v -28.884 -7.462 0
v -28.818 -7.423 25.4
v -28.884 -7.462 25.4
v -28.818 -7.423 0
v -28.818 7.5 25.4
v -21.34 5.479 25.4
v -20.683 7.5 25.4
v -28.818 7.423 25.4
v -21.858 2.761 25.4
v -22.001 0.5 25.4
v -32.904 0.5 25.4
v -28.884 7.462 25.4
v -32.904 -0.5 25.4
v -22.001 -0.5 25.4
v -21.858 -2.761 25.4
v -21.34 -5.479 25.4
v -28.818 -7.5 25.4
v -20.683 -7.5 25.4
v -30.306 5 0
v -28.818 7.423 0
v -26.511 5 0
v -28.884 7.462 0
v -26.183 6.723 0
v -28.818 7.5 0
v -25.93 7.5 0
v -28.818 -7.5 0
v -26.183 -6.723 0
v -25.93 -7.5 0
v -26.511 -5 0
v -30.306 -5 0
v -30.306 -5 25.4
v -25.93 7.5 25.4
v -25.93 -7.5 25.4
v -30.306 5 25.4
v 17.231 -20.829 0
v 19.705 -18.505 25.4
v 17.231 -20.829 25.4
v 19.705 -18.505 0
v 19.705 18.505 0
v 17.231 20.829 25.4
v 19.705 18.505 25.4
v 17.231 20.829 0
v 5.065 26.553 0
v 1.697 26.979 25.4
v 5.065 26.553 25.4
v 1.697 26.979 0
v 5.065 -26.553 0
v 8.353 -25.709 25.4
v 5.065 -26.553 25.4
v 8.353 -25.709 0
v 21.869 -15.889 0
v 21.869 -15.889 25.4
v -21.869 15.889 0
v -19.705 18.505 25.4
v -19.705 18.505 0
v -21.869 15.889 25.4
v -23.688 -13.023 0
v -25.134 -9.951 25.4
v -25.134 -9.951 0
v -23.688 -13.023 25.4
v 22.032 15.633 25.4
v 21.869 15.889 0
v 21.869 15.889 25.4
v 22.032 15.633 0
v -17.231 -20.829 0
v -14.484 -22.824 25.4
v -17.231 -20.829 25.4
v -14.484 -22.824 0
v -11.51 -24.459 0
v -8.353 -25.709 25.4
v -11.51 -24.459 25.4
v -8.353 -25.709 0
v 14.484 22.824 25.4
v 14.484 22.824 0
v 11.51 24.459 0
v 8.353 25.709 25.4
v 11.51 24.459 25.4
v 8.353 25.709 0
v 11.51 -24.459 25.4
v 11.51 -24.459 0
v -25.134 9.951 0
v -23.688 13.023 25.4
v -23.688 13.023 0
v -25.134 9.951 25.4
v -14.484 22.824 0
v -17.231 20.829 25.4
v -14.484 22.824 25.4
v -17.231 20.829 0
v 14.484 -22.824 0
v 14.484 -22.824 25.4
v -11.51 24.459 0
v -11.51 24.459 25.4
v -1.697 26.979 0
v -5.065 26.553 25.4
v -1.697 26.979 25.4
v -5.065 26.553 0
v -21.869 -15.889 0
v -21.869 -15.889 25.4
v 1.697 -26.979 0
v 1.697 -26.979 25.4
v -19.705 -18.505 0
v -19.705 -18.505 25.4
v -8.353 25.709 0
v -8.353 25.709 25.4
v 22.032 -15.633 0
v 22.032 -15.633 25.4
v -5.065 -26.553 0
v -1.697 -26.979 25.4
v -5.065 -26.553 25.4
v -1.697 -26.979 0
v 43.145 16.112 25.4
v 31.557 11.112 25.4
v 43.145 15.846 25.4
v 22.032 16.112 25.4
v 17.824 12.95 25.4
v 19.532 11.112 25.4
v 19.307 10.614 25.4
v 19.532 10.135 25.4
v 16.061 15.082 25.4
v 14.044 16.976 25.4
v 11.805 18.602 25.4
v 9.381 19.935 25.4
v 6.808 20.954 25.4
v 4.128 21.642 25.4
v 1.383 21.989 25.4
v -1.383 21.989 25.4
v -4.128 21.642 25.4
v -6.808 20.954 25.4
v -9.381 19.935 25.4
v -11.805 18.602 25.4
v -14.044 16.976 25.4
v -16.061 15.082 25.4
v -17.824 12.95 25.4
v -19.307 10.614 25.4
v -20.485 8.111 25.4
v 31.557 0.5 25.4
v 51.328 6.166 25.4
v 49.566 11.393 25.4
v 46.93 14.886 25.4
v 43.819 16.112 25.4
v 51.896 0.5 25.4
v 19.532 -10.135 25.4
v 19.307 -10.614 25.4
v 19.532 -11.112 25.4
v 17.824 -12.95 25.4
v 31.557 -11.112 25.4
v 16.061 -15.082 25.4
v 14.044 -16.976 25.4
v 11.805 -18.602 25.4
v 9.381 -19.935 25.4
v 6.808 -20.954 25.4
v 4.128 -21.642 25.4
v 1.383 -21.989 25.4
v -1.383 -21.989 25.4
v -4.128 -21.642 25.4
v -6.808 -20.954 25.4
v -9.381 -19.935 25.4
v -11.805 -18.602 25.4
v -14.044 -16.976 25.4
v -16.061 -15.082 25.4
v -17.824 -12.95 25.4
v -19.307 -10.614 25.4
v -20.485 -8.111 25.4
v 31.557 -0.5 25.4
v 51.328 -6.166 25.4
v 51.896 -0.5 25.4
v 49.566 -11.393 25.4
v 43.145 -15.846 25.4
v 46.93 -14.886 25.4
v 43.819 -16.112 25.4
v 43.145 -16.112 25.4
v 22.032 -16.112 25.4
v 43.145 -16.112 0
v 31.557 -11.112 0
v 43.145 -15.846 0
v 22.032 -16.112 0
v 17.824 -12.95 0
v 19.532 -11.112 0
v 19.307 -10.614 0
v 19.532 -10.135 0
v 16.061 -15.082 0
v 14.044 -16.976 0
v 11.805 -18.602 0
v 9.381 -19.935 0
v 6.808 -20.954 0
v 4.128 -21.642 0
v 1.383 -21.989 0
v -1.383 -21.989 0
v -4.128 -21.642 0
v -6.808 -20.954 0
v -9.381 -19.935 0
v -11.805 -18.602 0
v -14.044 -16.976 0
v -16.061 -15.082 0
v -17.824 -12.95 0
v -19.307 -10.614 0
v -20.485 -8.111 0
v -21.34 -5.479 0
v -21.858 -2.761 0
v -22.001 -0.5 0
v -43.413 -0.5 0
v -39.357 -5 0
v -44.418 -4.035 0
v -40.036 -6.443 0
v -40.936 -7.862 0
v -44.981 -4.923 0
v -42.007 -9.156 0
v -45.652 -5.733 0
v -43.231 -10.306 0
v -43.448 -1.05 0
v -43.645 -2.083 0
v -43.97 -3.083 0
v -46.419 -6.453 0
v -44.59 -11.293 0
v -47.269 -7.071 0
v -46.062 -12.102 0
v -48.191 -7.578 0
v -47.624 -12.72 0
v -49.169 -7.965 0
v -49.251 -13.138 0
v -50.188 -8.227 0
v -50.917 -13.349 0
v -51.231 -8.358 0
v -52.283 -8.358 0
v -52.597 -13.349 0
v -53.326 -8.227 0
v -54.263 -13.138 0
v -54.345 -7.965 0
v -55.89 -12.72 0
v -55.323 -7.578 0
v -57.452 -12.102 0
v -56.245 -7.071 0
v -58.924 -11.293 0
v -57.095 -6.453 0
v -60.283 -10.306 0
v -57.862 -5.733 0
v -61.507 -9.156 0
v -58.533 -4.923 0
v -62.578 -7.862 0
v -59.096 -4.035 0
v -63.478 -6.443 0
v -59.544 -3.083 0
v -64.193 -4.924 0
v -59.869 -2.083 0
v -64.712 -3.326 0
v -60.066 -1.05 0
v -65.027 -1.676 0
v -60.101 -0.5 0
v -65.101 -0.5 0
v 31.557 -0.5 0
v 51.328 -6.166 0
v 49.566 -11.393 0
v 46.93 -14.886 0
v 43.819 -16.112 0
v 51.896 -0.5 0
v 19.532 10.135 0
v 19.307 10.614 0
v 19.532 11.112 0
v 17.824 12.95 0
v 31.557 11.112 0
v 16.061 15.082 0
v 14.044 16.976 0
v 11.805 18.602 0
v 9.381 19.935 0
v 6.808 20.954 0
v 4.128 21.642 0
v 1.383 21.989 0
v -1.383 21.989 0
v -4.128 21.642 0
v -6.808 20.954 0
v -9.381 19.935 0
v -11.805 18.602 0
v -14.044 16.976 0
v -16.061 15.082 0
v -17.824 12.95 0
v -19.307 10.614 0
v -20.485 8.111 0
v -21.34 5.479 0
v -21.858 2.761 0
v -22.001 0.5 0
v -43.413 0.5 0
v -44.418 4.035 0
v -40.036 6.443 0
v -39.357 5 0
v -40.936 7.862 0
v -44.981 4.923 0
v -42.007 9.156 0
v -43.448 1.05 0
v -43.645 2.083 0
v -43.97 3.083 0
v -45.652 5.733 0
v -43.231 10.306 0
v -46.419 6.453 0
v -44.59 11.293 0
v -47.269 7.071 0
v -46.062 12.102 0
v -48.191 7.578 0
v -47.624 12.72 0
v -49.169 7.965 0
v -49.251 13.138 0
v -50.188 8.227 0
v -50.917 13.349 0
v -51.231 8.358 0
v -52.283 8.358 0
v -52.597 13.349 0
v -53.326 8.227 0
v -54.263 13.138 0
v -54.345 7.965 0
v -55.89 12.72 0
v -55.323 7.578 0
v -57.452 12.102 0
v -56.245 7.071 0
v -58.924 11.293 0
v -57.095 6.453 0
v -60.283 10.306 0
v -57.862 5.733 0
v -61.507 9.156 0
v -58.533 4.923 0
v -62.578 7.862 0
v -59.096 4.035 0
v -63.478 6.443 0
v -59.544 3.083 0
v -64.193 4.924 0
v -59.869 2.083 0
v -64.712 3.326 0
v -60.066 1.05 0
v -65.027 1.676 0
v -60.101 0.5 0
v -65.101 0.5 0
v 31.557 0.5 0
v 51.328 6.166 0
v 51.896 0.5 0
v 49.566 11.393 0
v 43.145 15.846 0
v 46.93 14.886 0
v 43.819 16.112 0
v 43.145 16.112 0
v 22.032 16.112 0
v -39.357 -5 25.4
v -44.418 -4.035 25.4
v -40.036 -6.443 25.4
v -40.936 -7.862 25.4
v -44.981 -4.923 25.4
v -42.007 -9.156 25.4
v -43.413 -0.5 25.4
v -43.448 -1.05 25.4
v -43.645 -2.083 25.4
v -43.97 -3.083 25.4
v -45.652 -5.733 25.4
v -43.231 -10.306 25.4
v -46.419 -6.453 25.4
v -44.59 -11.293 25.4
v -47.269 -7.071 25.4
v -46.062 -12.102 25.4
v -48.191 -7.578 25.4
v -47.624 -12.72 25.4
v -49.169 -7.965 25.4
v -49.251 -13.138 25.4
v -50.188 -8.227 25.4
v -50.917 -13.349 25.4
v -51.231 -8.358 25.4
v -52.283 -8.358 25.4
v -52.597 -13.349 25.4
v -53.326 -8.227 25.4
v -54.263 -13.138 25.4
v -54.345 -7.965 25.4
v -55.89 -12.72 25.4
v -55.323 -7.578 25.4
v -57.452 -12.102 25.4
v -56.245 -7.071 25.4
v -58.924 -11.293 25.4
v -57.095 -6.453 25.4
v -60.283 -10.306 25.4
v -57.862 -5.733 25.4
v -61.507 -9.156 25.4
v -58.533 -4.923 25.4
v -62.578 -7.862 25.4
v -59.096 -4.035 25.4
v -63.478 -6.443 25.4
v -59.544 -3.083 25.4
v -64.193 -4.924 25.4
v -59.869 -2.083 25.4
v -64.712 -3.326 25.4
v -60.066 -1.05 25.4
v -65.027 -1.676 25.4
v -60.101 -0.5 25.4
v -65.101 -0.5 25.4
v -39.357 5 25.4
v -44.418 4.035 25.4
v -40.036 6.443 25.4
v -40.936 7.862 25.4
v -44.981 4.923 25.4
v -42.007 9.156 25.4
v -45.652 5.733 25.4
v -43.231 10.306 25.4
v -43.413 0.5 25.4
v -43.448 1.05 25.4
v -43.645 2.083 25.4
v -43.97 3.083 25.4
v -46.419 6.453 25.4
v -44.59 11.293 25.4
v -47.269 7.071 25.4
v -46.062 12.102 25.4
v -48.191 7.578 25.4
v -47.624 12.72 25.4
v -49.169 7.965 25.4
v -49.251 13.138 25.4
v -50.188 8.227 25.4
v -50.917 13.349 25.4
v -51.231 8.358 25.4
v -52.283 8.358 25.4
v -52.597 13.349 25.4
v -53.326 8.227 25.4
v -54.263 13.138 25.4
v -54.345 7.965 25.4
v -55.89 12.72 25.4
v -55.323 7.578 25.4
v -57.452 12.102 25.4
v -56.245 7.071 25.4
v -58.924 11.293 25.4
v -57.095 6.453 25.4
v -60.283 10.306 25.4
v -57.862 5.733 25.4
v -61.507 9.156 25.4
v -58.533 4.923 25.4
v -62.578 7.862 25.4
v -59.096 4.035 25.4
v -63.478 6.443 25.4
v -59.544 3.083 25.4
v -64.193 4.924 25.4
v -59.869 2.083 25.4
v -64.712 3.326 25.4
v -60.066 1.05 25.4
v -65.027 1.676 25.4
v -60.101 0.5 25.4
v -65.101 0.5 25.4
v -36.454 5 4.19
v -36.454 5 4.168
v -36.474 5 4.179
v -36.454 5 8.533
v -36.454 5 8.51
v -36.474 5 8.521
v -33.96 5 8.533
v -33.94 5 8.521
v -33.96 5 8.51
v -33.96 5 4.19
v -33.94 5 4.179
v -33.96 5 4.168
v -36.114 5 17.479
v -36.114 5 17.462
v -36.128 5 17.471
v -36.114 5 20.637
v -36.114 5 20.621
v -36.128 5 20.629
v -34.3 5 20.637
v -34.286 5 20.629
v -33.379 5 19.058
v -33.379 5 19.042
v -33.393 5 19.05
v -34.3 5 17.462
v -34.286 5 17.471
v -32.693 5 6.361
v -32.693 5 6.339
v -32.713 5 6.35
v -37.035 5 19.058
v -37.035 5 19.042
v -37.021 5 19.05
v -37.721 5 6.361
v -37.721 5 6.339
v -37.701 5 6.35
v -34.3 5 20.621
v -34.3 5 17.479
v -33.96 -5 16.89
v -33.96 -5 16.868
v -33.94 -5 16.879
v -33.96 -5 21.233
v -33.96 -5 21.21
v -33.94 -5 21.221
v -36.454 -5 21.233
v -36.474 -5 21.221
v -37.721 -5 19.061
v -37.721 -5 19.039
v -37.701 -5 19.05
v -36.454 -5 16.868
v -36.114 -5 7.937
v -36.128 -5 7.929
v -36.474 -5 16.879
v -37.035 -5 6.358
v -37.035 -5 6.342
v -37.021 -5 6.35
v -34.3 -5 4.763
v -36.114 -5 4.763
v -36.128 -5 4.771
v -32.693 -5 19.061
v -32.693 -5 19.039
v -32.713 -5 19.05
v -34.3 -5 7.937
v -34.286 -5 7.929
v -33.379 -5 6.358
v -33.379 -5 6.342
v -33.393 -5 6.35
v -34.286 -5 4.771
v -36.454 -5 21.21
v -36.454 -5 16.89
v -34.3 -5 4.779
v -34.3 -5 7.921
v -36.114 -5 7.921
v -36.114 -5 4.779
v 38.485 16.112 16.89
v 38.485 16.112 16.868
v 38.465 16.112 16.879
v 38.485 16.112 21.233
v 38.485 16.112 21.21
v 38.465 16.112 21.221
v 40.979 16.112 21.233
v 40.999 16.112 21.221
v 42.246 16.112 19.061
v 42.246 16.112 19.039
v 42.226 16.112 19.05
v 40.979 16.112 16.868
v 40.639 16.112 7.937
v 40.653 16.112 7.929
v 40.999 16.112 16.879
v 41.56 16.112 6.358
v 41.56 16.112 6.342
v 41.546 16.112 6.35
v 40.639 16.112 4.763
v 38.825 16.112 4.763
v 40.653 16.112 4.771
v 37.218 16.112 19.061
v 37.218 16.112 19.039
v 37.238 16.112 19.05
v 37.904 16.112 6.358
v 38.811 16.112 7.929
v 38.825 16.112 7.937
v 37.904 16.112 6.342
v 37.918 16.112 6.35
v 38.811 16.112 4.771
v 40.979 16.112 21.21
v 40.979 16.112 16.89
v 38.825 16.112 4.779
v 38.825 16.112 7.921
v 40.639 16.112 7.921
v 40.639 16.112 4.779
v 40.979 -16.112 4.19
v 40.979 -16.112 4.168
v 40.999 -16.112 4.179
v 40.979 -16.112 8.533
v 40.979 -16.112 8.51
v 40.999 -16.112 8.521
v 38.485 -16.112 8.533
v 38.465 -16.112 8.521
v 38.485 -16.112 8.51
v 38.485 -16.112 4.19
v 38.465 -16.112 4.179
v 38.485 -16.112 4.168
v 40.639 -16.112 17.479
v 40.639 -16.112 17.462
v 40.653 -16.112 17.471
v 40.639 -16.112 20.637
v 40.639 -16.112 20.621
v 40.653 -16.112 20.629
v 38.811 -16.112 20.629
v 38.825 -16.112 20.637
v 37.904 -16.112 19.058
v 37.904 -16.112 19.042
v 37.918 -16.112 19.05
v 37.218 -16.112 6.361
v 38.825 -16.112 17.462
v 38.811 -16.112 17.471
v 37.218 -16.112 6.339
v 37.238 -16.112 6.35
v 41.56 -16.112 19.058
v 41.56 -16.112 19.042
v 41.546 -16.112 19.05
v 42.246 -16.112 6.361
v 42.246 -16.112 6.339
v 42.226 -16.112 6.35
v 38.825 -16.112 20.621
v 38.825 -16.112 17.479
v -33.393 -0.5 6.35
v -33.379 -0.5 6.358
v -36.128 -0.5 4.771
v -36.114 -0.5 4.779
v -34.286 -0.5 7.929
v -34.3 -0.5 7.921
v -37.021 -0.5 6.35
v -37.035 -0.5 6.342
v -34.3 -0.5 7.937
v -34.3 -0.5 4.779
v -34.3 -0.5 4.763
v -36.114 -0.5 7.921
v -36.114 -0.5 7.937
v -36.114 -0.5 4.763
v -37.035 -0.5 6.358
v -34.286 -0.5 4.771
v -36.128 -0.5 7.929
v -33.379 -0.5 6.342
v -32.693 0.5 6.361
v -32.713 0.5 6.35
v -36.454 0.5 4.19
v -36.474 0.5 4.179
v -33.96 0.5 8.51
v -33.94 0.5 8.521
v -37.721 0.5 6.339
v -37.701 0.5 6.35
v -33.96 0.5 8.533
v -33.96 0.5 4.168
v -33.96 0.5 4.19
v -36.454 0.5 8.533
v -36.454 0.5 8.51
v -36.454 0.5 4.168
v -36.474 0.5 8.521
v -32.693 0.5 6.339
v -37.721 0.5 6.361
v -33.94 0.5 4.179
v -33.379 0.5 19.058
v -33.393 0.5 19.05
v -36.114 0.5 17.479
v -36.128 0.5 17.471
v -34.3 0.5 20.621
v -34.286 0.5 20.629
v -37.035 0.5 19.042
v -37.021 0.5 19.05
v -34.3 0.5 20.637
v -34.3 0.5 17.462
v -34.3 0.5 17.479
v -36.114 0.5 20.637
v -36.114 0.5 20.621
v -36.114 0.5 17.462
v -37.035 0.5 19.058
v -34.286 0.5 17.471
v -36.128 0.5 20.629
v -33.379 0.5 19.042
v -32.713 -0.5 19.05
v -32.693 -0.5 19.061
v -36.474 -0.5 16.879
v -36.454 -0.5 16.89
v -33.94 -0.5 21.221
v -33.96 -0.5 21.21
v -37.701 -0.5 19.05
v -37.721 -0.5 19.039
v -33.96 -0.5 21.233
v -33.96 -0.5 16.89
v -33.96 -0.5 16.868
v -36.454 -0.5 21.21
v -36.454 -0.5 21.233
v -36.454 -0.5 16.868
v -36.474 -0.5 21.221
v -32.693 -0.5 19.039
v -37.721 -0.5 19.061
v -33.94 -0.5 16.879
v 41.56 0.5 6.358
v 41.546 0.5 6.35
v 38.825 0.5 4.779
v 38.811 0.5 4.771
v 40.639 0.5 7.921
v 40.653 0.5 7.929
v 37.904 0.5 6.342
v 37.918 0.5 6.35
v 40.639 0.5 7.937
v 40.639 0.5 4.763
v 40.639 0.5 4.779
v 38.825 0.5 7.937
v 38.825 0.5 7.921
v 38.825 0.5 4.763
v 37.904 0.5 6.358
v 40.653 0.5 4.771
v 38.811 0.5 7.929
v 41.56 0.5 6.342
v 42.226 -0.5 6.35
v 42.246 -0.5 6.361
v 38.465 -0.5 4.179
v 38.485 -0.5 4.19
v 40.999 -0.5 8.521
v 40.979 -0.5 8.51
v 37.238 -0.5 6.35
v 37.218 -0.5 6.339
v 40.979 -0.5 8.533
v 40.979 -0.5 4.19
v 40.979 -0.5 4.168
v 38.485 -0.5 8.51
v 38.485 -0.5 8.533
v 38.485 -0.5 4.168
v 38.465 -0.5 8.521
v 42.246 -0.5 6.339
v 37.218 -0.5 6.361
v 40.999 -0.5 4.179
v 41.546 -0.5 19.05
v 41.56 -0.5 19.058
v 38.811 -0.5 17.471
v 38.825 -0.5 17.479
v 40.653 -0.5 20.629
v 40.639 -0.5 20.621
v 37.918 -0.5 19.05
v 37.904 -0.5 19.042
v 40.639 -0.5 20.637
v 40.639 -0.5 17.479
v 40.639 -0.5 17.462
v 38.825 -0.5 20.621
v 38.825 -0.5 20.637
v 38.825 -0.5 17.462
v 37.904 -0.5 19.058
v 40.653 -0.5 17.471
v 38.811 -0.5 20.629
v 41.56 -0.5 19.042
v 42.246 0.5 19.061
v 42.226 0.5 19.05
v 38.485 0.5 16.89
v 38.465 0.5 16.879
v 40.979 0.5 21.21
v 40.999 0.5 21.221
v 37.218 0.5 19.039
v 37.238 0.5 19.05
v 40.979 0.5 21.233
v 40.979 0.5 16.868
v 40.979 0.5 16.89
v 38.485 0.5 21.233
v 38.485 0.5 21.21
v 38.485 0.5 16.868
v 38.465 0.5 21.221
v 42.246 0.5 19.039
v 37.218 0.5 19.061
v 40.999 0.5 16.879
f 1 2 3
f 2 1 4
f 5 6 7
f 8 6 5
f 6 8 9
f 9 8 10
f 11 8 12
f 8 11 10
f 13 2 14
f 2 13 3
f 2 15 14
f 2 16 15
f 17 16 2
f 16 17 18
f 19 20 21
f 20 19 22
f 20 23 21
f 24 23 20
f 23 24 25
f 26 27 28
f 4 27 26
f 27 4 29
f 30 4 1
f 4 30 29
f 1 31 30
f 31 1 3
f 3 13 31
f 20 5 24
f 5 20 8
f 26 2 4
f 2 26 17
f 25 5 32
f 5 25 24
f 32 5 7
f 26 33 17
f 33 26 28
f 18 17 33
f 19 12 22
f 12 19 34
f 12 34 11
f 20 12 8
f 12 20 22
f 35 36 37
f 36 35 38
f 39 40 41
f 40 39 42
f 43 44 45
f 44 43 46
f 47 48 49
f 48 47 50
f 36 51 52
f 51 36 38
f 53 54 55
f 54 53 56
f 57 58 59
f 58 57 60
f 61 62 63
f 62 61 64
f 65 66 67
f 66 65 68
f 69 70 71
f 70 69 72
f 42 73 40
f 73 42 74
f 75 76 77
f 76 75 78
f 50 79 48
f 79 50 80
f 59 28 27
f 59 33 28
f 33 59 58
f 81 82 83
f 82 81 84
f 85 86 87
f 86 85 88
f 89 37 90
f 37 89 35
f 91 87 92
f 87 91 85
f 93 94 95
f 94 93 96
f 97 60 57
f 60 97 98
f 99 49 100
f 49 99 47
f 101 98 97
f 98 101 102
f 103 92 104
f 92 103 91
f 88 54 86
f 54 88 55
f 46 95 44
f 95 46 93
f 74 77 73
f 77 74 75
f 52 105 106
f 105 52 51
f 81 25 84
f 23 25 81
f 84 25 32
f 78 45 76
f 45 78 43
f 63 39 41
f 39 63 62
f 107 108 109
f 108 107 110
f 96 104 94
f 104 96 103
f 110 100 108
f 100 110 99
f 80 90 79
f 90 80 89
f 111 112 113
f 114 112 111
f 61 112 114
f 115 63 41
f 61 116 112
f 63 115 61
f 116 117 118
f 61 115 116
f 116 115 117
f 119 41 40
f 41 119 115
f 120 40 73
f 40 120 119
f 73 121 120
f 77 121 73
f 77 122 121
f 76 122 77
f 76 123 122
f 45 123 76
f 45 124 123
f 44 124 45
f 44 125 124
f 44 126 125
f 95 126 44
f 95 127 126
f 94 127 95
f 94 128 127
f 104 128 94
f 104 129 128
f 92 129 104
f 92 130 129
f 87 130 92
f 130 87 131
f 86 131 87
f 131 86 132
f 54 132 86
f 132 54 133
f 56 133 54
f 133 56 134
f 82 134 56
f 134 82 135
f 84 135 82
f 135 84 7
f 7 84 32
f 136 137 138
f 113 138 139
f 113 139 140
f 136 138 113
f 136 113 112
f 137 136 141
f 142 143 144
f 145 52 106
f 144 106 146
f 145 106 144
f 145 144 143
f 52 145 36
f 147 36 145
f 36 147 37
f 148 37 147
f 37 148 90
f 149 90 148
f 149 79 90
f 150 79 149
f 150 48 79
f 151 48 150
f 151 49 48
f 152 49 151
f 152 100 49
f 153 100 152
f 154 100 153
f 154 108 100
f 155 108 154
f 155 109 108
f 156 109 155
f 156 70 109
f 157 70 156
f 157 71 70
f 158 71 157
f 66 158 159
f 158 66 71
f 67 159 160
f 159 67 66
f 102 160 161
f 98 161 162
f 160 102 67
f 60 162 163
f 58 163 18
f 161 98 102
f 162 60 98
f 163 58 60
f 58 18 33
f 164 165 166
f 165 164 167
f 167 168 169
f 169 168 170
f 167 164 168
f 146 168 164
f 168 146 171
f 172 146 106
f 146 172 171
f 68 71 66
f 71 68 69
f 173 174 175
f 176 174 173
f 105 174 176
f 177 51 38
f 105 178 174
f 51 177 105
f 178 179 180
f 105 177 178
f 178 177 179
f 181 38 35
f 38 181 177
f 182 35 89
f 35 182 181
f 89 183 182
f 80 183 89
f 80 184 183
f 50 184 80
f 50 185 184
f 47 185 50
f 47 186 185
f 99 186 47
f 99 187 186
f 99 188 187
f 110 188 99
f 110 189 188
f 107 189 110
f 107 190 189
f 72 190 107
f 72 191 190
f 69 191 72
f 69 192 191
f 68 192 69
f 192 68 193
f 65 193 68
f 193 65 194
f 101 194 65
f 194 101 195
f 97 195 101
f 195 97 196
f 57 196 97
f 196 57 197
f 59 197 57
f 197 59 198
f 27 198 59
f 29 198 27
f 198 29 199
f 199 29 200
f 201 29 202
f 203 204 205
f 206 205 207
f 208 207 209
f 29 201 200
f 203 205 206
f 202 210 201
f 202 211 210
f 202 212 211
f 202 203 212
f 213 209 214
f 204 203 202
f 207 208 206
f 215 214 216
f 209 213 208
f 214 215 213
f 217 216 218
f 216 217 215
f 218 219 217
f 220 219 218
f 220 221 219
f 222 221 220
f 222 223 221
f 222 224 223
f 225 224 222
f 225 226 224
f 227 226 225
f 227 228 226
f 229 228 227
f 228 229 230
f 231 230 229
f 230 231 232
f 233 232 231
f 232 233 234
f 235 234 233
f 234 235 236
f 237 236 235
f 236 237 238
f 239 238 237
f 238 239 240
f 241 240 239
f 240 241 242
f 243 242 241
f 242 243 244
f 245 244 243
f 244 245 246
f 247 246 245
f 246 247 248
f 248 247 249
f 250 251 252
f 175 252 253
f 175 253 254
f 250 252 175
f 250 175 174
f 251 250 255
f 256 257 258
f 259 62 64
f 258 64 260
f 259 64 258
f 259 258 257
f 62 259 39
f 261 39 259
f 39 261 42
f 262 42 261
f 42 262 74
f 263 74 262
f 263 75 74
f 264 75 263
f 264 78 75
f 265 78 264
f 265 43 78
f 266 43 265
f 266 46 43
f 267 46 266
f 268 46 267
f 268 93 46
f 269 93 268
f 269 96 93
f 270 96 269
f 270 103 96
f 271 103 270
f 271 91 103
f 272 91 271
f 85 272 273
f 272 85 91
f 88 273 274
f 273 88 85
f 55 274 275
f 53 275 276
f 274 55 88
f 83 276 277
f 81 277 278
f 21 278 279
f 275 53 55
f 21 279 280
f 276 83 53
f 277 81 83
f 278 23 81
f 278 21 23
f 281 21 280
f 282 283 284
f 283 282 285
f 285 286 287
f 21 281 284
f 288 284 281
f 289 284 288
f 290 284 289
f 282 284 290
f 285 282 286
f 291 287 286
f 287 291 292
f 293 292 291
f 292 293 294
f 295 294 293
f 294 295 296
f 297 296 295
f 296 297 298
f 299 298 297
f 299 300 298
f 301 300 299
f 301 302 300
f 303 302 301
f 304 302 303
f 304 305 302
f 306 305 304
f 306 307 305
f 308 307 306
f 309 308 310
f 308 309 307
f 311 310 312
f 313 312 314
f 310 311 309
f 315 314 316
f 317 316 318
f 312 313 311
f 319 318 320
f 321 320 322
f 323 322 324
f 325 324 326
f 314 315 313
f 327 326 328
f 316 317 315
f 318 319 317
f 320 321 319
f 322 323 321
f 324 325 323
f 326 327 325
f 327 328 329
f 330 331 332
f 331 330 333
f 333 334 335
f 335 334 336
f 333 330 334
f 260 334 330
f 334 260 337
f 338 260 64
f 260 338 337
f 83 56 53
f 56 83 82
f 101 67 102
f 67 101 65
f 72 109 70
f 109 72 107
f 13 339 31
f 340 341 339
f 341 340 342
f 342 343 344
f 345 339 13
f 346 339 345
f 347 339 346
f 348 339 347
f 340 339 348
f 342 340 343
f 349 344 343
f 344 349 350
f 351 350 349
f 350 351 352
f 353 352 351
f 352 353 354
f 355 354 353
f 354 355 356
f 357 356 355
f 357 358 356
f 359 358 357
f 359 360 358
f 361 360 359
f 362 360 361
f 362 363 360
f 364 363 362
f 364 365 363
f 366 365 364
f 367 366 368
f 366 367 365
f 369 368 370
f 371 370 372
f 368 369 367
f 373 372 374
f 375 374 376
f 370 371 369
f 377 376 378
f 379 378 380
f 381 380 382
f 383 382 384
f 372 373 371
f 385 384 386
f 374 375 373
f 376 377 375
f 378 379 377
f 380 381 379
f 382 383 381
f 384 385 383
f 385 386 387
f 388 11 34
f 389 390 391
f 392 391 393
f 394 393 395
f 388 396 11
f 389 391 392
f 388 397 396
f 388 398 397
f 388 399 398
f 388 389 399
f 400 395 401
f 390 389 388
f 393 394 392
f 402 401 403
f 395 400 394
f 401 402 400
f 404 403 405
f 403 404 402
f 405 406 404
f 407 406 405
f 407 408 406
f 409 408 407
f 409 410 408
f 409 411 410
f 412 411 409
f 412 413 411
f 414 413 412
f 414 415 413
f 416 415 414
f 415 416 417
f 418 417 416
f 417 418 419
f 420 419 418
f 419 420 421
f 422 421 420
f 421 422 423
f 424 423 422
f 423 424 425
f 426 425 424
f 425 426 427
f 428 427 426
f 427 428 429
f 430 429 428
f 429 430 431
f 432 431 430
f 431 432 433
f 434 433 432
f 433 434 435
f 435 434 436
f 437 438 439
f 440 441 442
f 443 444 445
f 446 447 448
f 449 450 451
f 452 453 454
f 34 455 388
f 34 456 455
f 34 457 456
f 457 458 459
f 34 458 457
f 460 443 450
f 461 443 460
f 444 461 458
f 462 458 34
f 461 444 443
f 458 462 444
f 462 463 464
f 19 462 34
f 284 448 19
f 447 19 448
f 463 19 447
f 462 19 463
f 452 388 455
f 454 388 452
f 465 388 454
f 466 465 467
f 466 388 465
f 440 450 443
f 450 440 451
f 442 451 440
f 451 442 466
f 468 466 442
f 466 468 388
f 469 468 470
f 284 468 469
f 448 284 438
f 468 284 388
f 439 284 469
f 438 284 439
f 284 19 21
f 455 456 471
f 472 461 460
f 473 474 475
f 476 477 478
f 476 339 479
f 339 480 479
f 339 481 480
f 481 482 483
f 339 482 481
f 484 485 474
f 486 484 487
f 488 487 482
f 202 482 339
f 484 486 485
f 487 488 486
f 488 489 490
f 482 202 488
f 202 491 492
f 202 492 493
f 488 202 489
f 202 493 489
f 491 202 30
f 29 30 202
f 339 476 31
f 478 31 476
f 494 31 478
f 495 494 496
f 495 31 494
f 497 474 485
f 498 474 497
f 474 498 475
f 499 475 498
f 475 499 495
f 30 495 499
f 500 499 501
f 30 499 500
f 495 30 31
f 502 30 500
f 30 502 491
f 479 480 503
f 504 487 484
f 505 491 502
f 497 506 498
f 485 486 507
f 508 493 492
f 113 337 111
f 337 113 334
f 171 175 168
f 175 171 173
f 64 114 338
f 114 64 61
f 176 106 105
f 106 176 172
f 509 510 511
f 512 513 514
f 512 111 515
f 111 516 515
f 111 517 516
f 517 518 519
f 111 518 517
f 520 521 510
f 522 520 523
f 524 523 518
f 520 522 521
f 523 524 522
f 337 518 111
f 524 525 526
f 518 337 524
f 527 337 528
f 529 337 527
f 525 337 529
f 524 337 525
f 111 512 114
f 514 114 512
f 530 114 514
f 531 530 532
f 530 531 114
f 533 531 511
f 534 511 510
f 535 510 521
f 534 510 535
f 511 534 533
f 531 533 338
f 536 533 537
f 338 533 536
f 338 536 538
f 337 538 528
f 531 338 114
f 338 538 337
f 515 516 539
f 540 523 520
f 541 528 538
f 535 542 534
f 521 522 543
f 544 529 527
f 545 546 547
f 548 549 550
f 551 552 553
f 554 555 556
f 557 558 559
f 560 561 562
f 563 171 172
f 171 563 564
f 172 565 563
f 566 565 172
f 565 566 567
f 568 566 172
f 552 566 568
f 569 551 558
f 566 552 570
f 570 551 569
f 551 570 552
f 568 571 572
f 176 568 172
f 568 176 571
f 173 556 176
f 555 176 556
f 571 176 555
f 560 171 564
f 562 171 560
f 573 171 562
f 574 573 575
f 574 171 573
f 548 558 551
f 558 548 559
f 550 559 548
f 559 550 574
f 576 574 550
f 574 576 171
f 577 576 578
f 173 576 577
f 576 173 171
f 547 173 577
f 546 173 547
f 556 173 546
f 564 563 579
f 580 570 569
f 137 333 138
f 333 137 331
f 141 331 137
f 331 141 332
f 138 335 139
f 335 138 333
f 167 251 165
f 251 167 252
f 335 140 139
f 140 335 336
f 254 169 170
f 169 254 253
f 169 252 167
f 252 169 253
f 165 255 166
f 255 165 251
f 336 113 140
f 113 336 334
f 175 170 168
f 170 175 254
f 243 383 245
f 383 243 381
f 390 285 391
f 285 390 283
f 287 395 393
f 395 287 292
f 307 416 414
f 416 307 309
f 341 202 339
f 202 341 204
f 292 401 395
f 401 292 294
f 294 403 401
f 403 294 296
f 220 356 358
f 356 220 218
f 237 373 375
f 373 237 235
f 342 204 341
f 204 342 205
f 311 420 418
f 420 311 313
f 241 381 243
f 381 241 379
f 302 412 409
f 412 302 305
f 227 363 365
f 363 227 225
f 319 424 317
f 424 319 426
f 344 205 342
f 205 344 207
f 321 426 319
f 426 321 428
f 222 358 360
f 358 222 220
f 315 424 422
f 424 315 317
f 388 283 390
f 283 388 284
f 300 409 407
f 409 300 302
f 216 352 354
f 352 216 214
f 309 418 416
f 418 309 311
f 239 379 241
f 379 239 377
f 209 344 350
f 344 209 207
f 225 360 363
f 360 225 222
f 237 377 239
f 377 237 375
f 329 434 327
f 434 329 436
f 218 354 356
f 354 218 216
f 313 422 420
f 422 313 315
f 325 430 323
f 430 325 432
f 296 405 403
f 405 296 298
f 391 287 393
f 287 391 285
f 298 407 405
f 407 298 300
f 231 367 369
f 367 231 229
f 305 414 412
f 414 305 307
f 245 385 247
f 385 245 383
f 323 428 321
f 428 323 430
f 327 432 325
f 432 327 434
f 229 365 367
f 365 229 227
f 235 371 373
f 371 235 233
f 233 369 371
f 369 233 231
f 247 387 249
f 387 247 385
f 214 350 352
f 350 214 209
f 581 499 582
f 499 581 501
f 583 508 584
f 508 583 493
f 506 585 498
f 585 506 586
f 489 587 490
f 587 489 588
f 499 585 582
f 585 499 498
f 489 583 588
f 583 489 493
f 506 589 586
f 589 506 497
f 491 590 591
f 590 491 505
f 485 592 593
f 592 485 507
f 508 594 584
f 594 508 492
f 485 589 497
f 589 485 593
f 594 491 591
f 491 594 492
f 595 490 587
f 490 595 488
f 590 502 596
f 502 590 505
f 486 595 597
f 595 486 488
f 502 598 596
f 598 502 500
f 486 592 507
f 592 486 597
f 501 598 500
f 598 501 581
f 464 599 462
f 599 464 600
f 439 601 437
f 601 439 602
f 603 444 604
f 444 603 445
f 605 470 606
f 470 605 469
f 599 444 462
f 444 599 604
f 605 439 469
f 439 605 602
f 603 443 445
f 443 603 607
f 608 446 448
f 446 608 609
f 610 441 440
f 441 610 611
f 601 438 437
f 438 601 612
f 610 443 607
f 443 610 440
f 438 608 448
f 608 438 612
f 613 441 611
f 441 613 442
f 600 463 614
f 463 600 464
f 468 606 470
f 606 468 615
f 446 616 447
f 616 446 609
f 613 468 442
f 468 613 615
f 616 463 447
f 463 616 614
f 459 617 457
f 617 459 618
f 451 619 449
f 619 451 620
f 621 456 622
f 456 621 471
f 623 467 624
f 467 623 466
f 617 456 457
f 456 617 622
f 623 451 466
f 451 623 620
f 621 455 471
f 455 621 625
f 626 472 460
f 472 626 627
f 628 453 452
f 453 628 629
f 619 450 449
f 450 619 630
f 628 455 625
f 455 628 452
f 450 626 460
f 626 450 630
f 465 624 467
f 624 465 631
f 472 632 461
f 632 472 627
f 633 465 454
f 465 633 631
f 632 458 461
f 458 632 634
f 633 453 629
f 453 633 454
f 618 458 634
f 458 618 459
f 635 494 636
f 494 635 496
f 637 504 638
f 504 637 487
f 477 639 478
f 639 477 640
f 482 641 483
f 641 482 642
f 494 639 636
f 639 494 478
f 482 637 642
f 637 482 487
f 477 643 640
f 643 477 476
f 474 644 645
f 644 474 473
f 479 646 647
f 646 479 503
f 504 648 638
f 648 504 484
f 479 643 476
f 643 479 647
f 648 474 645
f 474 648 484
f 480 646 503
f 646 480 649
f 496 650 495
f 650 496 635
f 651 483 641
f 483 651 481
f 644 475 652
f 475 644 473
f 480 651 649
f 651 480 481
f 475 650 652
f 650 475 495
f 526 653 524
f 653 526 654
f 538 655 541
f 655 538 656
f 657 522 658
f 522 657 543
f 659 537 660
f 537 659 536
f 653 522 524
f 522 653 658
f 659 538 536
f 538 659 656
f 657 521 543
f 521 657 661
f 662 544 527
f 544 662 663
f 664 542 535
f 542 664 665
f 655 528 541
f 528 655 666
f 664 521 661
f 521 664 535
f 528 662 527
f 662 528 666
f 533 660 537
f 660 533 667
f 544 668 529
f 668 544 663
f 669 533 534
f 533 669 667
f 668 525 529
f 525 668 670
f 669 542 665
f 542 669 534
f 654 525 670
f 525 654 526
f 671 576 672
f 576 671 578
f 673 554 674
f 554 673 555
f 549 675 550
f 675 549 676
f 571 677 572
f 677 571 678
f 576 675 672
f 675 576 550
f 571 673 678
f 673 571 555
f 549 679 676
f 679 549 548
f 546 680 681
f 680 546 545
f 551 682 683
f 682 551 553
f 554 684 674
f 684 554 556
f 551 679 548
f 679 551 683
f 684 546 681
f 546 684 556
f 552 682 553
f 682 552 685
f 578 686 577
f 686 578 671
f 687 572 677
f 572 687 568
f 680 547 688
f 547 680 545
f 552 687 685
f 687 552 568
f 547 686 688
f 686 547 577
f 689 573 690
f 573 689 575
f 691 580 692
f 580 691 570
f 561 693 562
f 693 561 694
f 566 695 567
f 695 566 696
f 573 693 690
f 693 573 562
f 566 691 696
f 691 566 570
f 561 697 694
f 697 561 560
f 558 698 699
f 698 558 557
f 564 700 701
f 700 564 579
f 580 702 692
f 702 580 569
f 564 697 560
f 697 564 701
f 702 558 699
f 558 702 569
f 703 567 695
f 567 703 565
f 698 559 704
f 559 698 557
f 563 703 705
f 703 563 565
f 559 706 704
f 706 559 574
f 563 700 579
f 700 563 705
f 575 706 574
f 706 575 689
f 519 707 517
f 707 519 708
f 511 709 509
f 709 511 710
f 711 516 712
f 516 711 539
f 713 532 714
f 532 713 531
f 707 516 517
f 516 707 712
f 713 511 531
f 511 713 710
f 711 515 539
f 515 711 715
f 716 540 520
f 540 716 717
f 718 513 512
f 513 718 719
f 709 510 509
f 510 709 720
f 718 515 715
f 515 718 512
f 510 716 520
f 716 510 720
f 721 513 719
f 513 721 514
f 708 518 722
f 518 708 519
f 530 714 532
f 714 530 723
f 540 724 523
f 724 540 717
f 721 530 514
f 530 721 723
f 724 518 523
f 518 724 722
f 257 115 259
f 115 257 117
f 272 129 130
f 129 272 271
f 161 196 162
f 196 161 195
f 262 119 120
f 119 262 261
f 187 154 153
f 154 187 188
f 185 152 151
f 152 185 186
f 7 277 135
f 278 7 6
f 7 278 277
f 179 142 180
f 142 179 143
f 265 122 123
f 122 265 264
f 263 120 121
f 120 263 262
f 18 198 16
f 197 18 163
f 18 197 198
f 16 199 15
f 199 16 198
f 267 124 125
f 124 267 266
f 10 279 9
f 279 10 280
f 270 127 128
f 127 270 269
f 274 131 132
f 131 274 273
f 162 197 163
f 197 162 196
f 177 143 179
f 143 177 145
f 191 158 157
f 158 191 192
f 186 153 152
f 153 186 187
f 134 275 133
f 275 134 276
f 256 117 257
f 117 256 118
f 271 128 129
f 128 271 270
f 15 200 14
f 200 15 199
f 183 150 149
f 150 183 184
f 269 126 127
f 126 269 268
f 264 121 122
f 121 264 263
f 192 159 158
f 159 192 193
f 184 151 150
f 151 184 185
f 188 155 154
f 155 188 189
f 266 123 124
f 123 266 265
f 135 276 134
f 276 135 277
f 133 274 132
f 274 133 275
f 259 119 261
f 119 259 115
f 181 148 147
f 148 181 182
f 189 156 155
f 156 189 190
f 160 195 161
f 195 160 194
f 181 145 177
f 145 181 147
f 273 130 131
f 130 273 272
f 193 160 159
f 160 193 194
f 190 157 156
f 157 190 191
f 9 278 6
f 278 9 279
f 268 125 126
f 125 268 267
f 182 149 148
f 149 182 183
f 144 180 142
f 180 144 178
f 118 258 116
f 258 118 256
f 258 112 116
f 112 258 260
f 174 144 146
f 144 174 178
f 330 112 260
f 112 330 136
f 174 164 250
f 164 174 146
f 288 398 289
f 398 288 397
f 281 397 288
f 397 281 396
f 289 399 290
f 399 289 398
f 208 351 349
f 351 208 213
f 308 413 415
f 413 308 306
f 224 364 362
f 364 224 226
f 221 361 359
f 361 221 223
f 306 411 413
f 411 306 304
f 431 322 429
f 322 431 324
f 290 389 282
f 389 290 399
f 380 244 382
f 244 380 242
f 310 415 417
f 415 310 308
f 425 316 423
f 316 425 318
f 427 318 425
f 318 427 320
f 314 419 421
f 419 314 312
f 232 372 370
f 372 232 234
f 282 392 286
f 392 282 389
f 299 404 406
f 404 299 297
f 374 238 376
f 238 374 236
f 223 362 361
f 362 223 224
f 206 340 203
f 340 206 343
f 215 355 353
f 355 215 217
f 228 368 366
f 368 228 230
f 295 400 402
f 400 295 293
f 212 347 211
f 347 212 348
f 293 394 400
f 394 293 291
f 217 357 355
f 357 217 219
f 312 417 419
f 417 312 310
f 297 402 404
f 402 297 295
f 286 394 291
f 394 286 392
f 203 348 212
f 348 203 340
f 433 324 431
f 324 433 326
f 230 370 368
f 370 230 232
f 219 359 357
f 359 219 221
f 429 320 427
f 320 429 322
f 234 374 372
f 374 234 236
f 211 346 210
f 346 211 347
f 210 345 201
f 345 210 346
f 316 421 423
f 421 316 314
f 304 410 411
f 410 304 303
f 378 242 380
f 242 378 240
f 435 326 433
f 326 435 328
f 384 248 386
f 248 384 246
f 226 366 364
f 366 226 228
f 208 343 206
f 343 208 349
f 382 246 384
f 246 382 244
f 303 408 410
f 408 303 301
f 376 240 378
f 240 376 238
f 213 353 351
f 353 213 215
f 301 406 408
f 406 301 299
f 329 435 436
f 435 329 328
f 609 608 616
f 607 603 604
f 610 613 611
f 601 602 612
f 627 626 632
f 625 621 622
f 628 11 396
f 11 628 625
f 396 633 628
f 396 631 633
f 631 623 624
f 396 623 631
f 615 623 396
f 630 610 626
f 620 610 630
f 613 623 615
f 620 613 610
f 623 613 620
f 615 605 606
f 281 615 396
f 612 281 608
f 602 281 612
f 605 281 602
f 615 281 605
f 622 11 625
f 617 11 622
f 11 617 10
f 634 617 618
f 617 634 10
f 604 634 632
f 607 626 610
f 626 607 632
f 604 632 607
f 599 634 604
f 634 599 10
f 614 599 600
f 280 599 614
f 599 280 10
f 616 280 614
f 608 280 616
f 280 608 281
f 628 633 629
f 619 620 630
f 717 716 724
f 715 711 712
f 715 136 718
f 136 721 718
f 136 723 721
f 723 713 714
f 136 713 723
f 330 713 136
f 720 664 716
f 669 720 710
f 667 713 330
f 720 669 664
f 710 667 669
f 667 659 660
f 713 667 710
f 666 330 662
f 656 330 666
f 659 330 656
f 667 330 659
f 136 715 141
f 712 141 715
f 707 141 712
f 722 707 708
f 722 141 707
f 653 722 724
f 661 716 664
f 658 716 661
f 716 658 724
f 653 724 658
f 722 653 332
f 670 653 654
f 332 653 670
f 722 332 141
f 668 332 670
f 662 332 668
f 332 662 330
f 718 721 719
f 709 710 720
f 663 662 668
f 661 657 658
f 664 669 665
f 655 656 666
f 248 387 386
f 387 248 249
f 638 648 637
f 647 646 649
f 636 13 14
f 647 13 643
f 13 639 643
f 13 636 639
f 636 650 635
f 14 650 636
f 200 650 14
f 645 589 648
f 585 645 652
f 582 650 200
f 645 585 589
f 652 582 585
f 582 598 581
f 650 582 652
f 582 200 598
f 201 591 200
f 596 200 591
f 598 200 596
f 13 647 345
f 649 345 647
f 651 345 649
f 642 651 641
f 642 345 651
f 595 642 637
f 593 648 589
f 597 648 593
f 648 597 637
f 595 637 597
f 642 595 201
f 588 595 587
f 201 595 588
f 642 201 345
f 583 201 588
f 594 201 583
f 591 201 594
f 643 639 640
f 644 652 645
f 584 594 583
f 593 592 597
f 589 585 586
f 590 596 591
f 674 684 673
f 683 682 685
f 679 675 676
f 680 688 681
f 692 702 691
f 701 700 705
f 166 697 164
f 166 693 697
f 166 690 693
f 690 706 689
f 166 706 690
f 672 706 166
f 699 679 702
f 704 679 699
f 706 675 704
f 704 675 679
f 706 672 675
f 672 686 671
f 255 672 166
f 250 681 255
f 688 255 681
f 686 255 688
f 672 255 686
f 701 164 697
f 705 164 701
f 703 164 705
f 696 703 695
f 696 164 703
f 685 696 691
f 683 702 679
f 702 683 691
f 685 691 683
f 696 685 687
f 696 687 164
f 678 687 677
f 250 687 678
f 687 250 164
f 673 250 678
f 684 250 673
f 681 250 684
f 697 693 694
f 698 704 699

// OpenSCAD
include <MCAD/units.scad>
include <MCAD/shapes.scad>

// Created by frontier204 for Thingiverse
// July 2014

// Thickness of the walls between the holes and the item
wall_thickness = 5;			// [3:10]
// Diameter of the tube
tube_diam = 44.064;
// The diameter of the item to be mounted
mount_diam = 16.75;
// Air gap between the tube and the item to mount, in case there are things like cables to clear, in X
cable_clearance_x = 9.525;
// Air gap in y
cable_clearance_y = 22.225;
// The gap to make this into two pieces
gap_width = 1;
// How high the entire structure is
mount_height = 25.4;
// diameter of the screw holes if you want to be able to thread the screw
screw_hole_diam = 3.175;
// diameter of the screw holes for a free fit
screw_hole_diam_big = 4.365;
// diameter of the head of the screws
screw_head_diam = 6.35;
// big number to just clear everything
BIG_NUMBER = 10000*1;

// creates this, centred where the tube goes, and extends in +X

item();

module item() {
// where the screws closest to the tube will go
top_screws_offset = -(tube_diam/2 + wall_thickness*2 + screw_head_diam/2);
//where the mount goes
mount_offset = top_screws_offset - screw_head_diam/2 - wall_thickness - mount_diam/2;
// the size of the mount nearest the mount, which sticks in by one wall
// thickness
neartube_mount_size = wall_thickness*3+screw_head_diam;
// the size of the box between the tube and the mount
midway_box_x = wall_thickness*2+screw_head_diam + cable_clearance_x/2; 
// where the screws go near the cable clearance box
midway_screws_offset = tube_diam/2 + cable_clearance_x + wall_thickness + screw_head_diam/2;

difference() {
	union() {
		// main wall around the tube
		cylinder(r=tube_diam/2+wall_thickness, h=mount_height, $fn=50);
		// mount for screws closest to the tube
		translate([-(neartube_mount_size/2+tube_diam/2),0,mount_height/2])
		box(neartube_mount_size,wall_thickness*2,mount_height);
		// reinforcements
		translate([-(tube_diam/2+wall_thickness/2),0,mount_height/2])
		hexagon(wall_thickness*3,mount_height);
		// box between the gap and the thing to mount (midway mount)
		translate([tube_diam/2 + midway_box_x/2, 0, mount_height/2])
		box(midway_box_x, cable_clearance_y+wall_thickness*2, mount_height);
		// reinforcements
		translate([tube_diam/2-wall_thickness/2 + midway_box_x + screw_head_diam/2, 0, 0])
		scale([cable_clearance_y/tube_diam,1,1])
		cylinder(r=(wall_thickness*2+cable_clearance_y)/2, h=mount_height, $fn=16);
		// main wall around the thing to mount
		translate([mount_offset,0,0])
		cylinder(r=mount_diam/2+wall_thickness,h=mount_height, $fn=50);
	}
	// hole for the tube
	cylinder(r=tube_diam/2, h=BIG_NUMBER, $fn=50, center=true);
	// screw holes near the tube
	translate([top_screws_offset,0,0])
	alternating_screw_holes();
	// the cable clearance gap
	translate([tube_diam/2,0,0])
	box(wall_thickness, cable_clearance_y, BIG_NUMBER);
	translate([(tube_diam+cable_clearance_x)/2,0,0])
	box(cable_clearance_x, cable_clearance_y, BIG_NUMBER);
	// screw holes near the gap
	translate([midway_screws_offset,0,0])
	alternating_screw_holes(-1);
	// thing to mount hole
	translate([mount_offset,0,0])
	cylinder(r=mount_diam/2,h=BIG_NUMBER,center=true, $fn=50);
	// gap
	box(BIG_NUMBER, gap_width, BIG_NUMBER);
}

module alternating_screw_holes( alternate_factor = 1 ) {
	translate([0,0,mount_height*1/4]) {
		rotate([90,0,0])
		hexagon(screw_hole_diam, BIG_NUMBER);
		translate([0,alternate_factor*BIG_NUMBER/2,0])
		rotate([90,0,0])
		hexagon(screw_hole_diam_big, BIG_NUMBER);
	}
	translate([0,0,mount_height*3/4]) {
		rotate([90,0,0])
		hexagon(screw_hole_diam, BIG_NUMBER);
		translate([0,alternate_factor*-BIG_NUMBER/2,0])
		rotate([90,0,0])
		hexagon(screw_hole_diam_big, BIG_NUMBER);
	}
}

}
